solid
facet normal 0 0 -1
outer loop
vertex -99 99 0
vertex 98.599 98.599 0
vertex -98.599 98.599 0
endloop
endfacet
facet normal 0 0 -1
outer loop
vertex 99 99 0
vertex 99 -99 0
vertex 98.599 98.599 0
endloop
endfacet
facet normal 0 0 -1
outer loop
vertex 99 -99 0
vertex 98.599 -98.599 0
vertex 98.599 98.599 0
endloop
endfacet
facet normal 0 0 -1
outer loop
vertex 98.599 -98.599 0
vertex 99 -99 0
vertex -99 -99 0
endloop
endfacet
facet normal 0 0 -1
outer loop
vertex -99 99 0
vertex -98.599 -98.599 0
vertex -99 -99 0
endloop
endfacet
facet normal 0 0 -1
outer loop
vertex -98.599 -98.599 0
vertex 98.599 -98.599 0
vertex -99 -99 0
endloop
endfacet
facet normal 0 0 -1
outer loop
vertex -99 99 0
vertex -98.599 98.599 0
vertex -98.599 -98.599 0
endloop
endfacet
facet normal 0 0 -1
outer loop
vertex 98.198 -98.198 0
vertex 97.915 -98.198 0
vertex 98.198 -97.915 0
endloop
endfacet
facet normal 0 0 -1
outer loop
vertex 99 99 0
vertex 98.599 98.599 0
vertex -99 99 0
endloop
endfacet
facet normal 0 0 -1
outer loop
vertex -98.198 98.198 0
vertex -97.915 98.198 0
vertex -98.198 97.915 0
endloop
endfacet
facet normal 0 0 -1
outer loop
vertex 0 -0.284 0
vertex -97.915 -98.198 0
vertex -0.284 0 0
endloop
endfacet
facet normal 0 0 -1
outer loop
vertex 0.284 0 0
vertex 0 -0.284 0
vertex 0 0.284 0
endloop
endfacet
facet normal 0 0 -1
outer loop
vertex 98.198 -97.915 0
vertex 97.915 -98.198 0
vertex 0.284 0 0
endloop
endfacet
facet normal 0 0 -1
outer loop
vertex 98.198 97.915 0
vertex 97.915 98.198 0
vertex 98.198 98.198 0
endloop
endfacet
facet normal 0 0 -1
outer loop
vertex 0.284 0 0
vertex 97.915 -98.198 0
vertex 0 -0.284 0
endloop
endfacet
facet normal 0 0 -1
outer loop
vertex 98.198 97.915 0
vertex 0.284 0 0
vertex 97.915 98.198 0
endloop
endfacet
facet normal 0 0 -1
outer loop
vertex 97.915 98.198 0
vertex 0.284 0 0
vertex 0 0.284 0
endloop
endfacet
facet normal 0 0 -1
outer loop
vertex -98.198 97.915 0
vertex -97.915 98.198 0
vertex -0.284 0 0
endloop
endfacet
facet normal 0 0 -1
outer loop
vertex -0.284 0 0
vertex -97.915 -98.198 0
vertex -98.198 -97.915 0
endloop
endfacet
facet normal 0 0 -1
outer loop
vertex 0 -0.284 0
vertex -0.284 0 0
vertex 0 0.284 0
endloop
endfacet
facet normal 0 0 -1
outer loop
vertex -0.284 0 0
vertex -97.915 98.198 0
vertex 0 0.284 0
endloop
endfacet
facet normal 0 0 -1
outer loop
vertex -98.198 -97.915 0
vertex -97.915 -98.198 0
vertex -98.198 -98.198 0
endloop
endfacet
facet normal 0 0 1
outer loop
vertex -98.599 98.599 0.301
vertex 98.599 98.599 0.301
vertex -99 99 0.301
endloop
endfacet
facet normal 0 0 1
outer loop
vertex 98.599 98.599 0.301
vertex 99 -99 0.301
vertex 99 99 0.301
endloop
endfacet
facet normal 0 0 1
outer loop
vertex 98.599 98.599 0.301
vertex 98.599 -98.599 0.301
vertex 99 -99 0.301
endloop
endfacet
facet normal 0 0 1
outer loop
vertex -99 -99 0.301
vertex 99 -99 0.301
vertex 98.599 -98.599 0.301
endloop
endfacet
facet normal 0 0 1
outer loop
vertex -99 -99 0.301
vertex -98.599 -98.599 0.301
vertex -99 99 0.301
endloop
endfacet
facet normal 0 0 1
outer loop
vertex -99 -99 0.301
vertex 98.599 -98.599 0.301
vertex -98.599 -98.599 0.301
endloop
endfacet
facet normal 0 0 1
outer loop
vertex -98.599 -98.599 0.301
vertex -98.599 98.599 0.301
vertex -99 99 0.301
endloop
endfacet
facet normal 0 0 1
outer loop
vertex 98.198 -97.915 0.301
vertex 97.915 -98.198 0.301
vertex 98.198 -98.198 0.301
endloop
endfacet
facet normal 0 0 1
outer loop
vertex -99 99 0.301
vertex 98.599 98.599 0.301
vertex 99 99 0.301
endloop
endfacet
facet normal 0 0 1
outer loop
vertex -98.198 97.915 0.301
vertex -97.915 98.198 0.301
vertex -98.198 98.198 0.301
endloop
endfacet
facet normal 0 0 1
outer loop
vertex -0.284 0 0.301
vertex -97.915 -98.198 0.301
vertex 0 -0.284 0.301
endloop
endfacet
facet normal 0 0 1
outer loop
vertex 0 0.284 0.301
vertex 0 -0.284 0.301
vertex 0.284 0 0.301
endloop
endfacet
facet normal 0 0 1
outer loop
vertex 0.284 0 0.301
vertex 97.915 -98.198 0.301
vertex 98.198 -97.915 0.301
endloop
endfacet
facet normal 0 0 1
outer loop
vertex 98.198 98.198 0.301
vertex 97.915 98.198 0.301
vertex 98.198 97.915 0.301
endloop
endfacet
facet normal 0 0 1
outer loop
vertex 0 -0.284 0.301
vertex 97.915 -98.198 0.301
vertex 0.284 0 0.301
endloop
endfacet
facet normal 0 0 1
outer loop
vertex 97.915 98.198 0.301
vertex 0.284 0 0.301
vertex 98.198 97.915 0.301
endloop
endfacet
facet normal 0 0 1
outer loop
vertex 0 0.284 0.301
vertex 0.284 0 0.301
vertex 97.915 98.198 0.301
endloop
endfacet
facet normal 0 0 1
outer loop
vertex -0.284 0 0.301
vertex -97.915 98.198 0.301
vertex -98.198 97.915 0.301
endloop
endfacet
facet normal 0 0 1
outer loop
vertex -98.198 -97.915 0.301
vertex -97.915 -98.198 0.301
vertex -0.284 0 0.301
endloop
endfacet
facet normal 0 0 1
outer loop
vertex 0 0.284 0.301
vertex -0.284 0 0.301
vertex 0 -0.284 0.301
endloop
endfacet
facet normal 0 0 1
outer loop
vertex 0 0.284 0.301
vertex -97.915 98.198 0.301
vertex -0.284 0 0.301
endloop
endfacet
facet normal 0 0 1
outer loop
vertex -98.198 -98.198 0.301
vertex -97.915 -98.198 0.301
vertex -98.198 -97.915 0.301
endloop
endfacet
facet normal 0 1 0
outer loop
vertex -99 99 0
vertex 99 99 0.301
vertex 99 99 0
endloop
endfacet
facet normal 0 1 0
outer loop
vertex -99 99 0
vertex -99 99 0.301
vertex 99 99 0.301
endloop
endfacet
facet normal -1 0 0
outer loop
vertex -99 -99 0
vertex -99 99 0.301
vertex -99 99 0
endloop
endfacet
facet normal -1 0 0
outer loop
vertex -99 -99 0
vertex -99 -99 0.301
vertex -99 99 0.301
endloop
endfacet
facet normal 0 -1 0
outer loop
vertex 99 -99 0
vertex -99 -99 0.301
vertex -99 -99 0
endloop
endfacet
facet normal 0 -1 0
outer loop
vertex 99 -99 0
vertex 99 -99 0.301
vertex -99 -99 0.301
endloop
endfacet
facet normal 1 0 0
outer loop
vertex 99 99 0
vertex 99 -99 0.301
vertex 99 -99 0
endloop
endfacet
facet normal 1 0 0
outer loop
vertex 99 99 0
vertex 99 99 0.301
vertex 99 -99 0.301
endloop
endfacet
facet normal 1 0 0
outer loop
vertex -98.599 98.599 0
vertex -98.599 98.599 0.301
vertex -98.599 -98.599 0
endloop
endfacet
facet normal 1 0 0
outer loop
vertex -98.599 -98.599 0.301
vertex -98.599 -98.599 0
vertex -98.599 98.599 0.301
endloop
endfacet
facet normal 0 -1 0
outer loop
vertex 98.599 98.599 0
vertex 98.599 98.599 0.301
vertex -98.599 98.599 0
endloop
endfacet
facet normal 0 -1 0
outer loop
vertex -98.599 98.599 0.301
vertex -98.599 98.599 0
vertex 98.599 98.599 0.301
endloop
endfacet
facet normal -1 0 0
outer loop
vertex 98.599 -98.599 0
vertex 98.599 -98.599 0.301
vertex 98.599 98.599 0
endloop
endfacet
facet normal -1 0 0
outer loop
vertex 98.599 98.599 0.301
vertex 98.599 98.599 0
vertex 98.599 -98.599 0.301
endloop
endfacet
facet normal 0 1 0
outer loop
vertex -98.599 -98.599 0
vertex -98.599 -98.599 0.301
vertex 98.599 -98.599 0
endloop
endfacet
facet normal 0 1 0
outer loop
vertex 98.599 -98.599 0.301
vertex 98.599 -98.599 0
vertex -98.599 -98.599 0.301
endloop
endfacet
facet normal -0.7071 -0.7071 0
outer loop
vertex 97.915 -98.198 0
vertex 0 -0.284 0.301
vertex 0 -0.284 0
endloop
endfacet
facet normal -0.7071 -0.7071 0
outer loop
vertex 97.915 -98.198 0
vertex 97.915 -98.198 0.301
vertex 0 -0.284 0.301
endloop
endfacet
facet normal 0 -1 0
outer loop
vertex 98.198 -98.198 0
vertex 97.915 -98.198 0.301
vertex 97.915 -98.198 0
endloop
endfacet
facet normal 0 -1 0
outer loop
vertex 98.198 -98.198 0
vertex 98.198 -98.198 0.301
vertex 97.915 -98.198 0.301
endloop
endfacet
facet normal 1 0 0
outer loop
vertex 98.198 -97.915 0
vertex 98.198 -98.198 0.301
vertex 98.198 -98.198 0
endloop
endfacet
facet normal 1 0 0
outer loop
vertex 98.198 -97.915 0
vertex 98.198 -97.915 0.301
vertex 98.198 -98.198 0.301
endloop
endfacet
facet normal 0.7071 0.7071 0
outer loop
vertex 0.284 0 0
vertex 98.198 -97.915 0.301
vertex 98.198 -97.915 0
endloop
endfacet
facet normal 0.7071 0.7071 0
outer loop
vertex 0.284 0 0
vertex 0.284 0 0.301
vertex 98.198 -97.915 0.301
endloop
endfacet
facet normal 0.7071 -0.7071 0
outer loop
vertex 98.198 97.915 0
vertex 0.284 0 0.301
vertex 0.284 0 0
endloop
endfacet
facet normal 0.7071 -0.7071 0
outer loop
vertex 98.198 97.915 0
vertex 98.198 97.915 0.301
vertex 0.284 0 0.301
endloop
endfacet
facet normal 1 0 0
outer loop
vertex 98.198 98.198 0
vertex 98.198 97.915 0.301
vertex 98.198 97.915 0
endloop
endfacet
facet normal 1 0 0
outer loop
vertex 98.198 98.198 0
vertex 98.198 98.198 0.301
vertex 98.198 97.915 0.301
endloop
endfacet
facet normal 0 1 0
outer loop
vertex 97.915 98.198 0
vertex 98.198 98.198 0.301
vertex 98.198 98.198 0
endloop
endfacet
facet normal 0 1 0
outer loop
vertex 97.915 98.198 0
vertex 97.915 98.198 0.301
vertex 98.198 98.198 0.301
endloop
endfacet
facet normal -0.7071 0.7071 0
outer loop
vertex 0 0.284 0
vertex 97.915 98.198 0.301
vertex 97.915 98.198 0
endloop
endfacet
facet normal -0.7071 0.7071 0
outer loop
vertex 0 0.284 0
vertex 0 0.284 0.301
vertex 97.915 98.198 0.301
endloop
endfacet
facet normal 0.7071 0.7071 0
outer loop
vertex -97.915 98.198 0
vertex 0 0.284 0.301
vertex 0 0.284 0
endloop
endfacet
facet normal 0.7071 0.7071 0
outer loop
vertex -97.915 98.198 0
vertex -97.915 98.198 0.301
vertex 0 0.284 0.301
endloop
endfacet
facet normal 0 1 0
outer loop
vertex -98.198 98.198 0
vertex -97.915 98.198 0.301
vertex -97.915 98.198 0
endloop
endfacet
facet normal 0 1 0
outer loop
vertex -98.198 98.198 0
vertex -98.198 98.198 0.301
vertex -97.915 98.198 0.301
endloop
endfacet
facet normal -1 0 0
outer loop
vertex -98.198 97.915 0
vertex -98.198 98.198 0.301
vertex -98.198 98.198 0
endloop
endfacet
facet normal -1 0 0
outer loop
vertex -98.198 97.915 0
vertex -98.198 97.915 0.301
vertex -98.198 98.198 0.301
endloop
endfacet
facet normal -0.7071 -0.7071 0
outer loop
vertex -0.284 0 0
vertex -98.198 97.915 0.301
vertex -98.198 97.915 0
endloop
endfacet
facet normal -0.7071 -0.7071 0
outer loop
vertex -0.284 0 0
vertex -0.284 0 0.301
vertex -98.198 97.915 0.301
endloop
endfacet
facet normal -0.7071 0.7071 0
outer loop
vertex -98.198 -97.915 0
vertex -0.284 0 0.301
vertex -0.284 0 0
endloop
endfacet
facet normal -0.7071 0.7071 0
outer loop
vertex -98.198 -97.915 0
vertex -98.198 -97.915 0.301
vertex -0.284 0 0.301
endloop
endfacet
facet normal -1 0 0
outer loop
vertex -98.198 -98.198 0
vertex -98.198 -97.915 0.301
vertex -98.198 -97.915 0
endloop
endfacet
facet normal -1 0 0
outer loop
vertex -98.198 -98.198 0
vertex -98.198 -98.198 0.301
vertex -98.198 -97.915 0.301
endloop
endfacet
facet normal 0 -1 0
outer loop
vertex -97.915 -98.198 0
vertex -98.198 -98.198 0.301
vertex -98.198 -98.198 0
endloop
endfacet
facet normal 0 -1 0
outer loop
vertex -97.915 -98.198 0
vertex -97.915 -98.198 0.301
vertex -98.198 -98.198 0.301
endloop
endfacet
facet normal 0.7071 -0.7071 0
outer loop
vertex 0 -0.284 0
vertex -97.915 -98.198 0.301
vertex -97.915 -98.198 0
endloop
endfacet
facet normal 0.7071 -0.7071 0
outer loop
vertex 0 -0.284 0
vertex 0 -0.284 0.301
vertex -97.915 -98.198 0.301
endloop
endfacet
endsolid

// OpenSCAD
// X in square bed level pattern
// Corner-to-corner diagonals inside a square outline.

include <../../src/bedlevelpattern.scad>;

// Parameters
bed_level_pattern_type = "x in square";
print_area_width = 220.001;
print_area_depth = 220.001;
line_width = 0.401;
line_height = 0.301;
fill_percentage = 90; // Range: [50:100]
quality_value = 128;

$fn = quality_value;

// Generate the pattern
generate_bed_level_pattern(
  bed_level_pattern_type, print_area_width, print_area_depth, line_width, line_height,
  fill_percentage
);
